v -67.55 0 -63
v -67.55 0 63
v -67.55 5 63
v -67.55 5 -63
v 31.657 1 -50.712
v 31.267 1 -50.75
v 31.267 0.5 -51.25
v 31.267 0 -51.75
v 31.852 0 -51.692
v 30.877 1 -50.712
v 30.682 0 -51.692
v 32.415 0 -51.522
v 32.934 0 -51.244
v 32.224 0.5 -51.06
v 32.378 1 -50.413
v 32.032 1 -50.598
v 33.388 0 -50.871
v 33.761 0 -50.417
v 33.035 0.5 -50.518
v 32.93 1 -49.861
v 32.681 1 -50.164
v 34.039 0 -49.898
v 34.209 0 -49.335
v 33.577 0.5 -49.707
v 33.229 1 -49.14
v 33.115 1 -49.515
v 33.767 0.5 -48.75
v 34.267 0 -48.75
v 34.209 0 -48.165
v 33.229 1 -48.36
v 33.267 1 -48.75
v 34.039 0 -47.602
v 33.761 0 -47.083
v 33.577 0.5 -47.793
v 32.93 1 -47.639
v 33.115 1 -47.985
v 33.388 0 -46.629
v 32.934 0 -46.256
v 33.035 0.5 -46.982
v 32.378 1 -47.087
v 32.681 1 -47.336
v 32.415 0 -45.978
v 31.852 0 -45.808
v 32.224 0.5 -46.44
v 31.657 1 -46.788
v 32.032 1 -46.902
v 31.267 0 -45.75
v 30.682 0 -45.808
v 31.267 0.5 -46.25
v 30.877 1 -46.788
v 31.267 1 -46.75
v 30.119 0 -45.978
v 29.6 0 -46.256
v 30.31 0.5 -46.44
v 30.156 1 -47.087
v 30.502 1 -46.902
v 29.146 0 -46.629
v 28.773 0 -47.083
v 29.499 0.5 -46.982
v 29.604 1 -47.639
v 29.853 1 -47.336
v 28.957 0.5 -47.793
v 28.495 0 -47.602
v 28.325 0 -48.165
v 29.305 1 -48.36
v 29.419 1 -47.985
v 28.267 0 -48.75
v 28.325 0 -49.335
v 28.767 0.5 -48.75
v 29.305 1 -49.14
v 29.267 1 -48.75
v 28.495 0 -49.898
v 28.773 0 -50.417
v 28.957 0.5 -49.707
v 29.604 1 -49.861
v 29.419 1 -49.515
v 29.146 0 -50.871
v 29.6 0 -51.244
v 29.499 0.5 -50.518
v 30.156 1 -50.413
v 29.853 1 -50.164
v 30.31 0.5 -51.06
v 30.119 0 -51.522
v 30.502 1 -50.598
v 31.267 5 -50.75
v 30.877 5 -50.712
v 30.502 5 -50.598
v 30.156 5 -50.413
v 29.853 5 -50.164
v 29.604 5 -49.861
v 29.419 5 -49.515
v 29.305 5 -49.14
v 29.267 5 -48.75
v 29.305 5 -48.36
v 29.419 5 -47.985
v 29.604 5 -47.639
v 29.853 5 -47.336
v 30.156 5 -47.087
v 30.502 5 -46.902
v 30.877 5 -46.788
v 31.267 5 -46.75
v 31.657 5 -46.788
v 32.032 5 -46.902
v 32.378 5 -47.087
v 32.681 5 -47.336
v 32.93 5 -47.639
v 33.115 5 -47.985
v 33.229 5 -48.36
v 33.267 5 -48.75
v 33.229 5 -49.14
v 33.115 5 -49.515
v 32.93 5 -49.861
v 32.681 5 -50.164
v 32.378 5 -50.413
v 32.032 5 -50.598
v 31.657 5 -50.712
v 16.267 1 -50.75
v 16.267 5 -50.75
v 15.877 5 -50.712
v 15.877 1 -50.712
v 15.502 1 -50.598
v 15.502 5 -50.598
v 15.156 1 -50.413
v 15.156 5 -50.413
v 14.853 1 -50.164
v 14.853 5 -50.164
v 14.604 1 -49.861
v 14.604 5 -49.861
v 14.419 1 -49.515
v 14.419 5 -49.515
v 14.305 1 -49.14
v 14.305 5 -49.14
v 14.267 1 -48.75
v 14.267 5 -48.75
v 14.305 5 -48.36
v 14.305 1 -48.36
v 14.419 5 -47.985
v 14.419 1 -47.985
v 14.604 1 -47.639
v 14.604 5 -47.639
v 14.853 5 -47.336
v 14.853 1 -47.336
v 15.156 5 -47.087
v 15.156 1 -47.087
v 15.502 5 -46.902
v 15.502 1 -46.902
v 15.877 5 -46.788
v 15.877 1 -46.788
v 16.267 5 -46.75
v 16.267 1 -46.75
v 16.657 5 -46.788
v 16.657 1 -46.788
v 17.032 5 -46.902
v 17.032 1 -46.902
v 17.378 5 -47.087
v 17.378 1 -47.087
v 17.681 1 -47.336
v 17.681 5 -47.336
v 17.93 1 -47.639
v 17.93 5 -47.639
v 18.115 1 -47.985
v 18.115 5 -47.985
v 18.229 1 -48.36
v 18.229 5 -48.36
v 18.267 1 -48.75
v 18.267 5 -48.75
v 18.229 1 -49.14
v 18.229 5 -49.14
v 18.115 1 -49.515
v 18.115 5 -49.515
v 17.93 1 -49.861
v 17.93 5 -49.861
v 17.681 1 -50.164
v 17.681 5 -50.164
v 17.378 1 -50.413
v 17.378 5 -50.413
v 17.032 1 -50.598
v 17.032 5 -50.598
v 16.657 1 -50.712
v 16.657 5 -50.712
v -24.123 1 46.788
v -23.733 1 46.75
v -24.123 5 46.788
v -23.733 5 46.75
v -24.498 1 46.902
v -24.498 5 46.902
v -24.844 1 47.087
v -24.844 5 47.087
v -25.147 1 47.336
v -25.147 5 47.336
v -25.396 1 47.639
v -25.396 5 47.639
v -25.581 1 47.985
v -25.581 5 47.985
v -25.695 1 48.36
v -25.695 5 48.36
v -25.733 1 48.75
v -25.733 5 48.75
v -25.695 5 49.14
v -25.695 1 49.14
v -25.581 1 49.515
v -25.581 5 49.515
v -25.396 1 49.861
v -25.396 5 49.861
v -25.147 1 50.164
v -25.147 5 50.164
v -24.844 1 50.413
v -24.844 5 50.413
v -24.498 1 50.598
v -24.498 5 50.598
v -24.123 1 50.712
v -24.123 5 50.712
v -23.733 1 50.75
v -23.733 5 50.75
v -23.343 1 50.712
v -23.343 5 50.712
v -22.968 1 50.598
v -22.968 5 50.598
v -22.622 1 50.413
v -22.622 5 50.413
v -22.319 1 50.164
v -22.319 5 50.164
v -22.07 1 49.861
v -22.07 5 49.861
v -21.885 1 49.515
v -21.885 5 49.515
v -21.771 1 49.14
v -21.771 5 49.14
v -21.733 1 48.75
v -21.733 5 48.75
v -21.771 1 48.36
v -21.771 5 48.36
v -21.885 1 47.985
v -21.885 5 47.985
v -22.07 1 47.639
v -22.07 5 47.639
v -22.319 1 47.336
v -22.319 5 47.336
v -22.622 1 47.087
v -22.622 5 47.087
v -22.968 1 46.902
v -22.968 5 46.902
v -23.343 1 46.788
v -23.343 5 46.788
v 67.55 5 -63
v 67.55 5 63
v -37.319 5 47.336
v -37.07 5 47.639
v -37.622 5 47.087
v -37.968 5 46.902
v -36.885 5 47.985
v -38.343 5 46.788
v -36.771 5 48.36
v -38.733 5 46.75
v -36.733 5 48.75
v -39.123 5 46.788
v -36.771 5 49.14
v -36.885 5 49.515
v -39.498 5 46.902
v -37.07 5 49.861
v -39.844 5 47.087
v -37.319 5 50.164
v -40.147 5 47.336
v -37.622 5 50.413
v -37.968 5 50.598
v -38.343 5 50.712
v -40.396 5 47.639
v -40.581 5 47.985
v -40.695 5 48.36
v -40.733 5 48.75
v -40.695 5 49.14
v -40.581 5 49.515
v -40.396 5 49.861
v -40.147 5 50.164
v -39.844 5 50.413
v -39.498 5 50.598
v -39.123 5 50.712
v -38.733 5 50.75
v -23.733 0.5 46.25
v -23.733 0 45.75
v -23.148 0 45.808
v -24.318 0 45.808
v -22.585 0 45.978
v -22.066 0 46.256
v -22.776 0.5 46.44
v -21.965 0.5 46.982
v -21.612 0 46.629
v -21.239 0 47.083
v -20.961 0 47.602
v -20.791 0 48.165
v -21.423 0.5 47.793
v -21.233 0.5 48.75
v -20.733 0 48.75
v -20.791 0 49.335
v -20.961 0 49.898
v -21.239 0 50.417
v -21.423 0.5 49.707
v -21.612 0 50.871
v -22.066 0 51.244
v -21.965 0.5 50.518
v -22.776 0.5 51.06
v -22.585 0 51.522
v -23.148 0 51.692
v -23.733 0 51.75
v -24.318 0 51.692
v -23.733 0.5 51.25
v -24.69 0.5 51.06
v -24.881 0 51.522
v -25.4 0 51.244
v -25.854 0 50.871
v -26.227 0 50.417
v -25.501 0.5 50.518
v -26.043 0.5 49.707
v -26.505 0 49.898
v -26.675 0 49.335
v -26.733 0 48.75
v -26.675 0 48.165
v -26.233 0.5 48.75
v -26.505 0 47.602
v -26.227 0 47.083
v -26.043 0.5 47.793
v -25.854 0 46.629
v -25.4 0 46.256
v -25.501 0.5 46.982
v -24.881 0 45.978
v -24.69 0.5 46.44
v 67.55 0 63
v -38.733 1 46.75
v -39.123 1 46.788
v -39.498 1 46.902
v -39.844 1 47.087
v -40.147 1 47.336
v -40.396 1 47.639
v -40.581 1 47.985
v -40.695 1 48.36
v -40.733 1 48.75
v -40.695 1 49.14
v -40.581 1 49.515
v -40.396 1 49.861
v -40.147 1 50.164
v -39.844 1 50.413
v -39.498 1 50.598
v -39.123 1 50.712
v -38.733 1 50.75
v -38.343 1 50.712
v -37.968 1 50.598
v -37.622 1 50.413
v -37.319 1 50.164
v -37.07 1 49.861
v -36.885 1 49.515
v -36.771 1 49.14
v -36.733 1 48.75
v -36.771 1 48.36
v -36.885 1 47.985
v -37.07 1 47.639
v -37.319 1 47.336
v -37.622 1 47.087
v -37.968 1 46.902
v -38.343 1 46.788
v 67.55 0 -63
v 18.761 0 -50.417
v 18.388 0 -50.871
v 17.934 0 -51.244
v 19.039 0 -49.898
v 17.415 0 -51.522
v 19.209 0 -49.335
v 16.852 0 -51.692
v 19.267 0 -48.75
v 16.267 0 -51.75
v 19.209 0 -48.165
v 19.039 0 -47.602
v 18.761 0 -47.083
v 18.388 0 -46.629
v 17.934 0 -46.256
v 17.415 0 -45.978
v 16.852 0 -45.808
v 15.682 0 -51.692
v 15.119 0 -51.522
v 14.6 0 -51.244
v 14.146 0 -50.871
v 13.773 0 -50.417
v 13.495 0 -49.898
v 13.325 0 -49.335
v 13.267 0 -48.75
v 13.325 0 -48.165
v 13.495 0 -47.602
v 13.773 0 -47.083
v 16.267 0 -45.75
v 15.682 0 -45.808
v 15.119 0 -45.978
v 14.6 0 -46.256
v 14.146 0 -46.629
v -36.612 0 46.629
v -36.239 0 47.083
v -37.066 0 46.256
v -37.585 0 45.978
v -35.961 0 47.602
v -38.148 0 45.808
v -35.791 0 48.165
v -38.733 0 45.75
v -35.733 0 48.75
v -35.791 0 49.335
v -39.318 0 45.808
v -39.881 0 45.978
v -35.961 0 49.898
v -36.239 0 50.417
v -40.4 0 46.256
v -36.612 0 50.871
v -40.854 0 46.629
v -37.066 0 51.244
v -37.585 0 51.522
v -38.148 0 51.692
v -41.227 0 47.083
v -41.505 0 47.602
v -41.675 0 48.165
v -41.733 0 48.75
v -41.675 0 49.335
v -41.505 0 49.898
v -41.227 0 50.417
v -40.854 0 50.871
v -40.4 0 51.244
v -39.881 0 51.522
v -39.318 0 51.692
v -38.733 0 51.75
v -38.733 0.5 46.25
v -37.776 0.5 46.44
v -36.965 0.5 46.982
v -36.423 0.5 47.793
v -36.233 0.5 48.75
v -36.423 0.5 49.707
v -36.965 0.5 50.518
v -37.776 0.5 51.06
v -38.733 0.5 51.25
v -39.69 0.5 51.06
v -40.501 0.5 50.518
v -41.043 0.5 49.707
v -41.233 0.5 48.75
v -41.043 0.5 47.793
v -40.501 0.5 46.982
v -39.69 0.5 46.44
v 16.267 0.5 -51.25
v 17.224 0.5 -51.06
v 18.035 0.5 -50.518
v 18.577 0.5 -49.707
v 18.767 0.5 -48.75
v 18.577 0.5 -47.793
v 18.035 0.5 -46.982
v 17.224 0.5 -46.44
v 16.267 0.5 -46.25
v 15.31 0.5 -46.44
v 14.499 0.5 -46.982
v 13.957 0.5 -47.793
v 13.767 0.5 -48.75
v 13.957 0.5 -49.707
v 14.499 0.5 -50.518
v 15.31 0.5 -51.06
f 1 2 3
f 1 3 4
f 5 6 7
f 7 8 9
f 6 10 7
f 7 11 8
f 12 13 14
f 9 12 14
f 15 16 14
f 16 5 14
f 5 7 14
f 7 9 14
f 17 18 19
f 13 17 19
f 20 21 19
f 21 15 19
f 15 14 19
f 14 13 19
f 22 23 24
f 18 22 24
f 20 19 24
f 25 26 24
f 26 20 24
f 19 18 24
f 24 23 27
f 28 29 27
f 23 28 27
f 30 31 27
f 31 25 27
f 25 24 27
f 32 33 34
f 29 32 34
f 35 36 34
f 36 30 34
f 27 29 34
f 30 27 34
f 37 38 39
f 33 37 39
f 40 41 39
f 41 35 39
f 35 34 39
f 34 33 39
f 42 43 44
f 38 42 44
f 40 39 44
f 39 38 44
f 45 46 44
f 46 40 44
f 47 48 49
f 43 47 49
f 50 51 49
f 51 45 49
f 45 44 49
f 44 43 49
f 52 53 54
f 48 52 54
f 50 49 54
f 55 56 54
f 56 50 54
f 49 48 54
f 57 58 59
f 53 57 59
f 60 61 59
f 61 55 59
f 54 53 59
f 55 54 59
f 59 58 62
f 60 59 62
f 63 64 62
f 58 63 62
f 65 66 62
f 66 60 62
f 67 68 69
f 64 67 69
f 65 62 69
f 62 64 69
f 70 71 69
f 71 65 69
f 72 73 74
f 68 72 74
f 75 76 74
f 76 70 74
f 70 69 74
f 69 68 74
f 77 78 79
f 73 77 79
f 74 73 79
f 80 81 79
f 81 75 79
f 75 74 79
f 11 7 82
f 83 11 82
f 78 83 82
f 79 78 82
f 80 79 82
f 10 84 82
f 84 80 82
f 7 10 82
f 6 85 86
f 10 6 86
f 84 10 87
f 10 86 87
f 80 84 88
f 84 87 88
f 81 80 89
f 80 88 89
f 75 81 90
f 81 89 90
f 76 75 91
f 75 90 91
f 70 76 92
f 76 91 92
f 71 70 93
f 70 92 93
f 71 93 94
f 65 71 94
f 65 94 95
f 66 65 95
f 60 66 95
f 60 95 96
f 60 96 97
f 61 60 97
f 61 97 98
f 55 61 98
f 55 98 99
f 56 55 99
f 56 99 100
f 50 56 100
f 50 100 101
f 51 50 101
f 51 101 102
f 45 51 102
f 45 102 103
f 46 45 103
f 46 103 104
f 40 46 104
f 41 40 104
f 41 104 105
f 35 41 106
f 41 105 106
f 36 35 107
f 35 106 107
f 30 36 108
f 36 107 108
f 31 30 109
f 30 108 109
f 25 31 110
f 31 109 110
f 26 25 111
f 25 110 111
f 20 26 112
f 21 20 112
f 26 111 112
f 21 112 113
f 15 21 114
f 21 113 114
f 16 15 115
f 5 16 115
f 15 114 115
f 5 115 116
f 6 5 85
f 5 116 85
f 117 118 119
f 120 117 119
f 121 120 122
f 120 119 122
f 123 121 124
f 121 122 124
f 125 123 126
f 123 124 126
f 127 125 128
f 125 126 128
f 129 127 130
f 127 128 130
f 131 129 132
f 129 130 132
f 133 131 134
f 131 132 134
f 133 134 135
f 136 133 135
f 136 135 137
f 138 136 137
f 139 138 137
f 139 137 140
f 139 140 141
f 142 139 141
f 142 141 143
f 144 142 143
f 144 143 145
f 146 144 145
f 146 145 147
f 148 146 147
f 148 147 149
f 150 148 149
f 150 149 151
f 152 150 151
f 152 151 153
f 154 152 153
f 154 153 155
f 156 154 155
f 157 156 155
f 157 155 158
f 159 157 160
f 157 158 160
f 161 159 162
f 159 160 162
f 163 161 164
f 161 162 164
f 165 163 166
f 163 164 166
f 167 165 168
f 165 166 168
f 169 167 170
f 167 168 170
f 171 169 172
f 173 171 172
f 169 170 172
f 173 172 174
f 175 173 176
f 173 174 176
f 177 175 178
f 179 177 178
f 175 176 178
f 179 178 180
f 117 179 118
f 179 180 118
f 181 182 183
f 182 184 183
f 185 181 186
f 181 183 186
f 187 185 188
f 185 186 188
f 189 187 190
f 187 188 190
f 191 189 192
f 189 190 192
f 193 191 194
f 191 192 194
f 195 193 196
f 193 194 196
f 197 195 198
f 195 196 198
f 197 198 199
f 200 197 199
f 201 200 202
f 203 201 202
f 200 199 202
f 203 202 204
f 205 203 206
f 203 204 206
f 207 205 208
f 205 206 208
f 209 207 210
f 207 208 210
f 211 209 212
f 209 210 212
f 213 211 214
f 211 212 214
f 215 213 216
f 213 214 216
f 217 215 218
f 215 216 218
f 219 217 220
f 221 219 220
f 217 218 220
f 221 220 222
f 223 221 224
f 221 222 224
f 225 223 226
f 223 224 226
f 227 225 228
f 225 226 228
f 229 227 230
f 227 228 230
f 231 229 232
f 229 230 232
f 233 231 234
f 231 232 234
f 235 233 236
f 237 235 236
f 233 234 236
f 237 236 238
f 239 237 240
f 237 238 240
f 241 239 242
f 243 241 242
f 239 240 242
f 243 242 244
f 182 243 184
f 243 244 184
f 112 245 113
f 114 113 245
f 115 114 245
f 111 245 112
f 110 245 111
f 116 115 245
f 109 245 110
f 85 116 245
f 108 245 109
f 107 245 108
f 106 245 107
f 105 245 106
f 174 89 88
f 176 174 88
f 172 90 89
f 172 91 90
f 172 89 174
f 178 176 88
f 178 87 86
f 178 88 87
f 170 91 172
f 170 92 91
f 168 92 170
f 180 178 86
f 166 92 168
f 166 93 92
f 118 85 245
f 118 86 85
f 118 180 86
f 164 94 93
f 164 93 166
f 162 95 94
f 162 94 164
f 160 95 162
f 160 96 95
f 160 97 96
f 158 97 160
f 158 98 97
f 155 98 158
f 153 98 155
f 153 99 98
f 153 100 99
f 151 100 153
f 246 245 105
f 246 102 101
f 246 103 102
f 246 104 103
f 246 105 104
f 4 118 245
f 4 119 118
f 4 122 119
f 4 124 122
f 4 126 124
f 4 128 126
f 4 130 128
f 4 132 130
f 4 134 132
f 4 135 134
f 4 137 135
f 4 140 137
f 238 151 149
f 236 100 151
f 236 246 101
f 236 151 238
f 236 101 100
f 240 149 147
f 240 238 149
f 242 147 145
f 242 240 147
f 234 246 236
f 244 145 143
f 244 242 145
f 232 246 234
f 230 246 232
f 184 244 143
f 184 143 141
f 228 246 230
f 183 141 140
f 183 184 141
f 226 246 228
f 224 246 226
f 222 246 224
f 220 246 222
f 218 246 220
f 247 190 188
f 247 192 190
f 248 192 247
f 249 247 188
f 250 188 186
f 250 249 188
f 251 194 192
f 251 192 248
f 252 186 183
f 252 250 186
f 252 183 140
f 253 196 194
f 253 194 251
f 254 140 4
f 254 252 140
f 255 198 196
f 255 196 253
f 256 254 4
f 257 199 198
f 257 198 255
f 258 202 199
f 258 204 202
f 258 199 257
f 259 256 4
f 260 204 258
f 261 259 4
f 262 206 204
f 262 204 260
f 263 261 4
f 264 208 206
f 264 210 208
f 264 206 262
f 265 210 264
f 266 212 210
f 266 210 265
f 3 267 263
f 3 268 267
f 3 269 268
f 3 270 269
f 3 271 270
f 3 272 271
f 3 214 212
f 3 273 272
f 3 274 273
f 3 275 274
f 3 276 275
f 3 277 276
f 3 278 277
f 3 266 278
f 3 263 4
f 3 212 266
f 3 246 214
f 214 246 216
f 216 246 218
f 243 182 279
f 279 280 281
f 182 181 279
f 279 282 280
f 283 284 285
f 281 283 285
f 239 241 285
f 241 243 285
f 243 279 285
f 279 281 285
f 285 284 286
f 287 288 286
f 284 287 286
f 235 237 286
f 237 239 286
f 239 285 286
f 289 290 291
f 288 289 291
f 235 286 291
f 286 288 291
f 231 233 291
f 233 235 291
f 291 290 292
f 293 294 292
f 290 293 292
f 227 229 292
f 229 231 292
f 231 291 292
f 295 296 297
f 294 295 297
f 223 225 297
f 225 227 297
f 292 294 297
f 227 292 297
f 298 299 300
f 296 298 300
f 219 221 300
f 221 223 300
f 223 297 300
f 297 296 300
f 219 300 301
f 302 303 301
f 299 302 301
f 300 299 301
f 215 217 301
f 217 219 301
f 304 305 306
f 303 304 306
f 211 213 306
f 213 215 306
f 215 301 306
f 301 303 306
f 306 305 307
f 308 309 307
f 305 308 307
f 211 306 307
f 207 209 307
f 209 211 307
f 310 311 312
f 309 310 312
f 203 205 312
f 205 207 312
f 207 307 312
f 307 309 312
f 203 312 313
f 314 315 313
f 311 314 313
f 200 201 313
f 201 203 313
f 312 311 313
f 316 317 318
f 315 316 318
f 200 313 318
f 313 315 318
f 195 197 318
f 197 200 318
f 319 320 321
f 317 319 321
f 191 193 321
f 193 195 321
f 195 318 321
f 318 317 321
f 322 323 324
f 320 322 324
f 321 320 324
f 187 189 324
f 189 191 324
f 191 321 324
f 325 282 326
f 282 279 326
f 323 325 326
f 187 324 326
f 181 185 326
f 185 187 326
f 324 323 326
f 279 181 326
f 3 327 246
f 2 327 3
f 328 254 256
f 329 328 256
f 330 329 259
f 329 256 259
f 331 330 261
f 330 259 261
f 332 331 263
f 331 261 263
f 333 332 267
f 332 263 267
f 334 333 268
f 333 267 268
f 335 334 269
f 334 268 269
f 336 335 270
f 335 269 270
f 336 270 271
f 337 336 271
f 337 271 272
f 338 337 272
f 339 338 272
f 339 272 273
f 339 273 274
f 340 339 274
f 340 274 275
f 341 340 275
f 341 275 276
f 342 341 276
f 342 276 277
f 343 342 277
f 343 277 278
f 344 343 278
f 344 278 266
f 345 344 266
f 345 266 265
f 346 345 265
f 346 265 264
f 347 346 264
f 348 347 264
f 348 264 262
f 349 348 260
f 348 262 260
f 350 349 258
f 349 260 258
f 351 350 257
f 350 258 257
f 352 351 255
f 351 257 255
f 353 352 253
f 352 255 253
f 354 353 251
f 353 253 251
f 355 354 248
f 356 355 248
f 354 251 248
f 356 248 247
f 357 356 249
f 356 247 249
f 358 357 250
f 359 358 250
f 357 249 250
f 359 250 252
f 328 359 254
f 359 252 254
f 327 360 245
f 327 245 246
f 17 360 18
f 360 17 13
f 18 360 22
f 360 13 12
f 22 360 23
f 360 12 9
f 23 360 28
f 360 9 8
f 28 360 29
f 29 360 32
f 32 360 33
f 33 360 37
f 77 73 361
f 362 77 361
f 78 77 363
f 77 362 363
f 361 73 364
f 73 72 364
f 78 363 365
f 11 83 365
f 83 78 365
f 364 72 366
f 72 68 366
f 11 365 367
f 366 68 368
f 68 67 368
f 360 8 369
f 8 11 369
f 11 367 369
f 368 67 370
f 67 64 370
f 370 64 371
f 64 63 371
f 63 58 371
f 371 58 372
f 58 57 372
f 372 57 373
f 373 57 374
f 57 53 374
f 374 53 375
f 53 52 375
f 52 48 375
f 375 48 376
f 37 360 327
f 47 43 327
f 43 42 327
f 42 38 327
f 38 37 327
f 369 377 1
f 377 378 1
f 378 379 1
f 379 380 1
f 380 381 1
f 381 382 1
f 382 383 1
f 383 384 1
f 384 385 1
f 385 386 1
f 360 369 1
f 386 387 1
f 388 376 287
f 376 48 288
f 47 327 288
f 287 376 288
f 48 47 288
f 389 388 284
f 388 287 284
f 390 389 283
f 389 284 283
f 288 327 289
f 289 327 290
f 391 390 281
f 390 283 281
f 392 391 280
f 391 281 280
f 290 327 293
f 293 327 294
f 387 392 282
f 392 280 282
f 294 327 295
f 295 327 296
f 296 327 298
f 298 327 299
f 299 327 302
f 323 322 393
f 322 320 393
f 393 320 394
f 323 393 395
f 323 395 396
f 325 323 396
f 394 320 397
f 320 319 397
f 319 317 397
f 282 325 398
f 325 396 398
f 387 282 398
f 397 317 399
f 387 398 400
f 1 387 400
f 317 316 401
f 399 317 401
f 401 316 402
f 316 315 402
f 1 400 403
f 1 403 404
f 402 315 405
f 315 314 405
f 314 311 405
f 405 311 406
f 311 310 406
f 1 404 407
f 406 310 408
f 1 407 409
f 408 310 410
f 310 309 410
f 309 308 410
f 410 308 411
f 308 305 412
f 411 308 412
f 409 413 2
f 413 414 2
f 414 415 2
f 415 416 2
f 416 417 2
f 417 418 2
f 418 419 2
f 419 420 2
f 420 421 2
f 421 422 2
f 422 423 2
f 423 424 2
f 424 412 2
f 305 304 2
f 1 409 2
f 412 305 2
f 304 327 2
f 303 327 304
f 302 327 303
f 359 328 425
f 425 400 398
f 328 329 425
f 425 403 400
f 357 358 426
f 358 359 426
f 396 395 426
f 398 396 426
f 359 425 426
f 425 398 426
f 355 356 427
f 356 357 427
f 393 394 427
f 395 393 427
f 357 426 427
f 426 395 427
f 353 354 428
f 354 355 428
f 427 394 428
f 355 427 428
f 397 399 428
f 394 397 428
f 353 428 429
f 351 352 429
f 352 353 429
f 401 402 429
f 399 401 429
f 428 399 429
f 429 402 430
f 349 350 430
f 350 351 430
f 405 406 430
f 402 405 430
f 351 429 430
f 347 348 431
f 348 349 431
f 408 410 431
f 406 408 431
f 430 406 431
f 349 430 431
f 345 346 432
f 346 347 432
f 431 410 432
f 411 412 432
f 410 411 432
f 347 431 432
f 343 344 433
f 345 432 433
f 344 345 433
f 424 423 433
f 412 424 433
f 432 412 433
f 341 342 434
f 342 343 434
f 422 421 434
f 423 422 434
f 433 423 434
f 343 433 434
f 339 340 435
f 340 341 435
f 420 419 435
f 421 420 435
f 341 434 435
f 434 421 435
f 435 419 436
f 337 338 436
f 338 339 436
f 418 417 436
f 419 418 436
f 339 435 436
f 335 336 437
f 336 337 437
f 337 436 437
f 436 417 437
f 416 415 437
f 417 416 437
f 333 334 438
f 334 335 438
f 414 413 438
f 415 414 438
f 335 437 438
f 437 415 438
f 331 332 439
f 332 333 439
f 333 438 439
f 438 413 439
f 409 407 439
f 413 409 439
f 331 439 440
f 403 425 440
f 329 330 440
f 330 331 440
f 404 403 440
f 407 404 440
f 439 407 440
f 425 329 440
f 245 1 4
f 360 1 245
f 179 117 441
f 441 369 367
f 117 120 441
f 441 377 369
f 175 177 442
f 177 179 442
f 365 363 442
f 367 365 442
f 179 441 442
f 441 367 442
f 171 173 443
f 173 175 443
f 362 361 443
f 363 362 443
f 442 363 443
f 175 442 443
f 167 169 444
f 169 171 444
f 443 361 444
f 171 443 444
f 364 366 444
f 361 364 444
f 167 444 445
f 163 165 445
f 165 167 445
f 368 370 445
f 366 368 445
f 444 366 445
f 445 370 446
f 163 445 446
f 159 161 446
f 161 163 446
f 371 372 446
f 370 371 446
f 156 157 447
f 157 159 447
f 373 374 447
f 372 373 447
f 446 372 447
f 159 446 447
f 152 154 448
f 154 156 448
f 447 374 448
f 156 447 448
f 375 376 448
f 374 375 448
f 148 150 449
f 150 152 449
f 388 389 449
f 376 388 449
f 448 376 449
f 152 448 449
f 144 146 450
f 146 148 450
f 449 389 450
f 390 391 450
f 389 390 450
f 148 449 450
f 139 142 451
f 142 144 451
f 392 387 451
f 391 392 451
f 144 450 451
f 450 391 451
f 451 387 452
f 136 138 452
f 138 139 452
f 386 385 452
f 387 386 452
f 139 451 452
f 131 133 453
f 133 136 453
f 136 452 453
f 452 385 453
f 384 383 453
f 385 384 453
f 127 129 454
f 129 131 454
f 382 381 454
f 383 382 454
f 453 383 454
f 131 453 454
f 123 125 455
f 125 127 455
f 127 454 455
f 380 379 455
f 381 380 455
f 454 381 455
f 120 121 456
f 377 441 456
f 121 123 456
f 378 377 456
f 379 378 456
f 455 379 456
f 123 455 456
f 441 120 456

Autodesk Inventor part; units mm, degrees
ref_plane "YZ Plane" through (0, 0, 0) normal (1, 0, 0) x (0, 1, 0)
ref_plane "XZ Plane" through (0, 0, 0) normal (0, 1, 0) x (-1, 0, 0)
ref_plane "XY Plane" through (0, 0, 0) normal (0, 0, 1) x (1, 0, 0)
sketch "Schizzo1" plane through (0, 0, 0) normal (0, 1, 0) x (-1, 0, 0)
  line L0 (-67.55, 63) -> (67.55, 63)
  line L1 (67.55, 63) -> (67.55, -63)
  line L2 (67.55, -63) -> (-67.55, -63)
  line L3 (-67.55, -63) -> (-67.55, 63)
  line L4 (-67.55, 63) -> (67.55, -63) construction
  line L5 (67.55, 63) -> (-67.55, -63) construction
  line L6 (67.55, -55.2) -> (43.733, -55.2) construction
  line L7 (43.733, -55.2) -> (-36.267, -55.2) construction
  line L8 (-36.267, -55.2) -> (-36.267, -42.3) construction
  line L9 (-36.267, -42.3) -> (43.733, -42.3) construction
  line L10 (43.733, -42.3) -> (43.733, -55.2) construction
  line L11 (-36.267, 63) -> (-36.267, 55.2) construction
  line L12 (-36.267, 55.2) -> (43.733, 55.2) construction
  line L13 (43.733, 55.2) -> (43.733, 42.3) construction
  line L14 (43.733, 42.3) -> (-36.267, 42.3) construction
  line L15 (-36.267, 42.3) -> (-36.267, 55.2) construction
  line L16 (-36.267, -48.75) -> (-31.267, -48.75) construction
  circle A0 centre (-31.267, -48.75) radius 2
  line L17 (-31.267, -48.75) -> (-16.267, -48.75) construction
  circle A1 centre (-16.267, -48.75) radius 2
  line L18 (43.733, 48.75) -> (38.733, 48.75) construction
  circle A2 centre (38.733, 48.75) radius 2
  line L19 (38.733, 48.75) -> (23.733, 48.75) construction
  circle A3 centre (23.733, 48.75) radius 2
  line L20 (-31.267, -63) -> (-31.267, -55.2) construction
  point P0 (0, 0)
  dimension "d0" = 135.1
  dimension "d1" = 126
  dimension "d18" = 23.817
  dimension "d19" = 80
  dimension "d20" = 12.9
  dimension "d21" = 7.8
  dimension "d22" = 12.9
  dimension "d23" = 5
  dimension "d24" = 31.283
  dimension "d26" = 4
  dimension "d27" = 15
  dimension "d28" = 4
  dimension "d37" = 5
  dimension "d38" = 4
  dimension "d39" = 15
  dimension "d40" = 4
  dimension "d55" = 7.8
extrude "Estrusione1" add sketch "Schizzo1" along normal blind 5 contours L0 L1 L2 L3 | A0 | A1 | A2 | A3
hole "Foro3" at (16.267, 0, -48.75) at (31.267, 0, -48.75) at (-23.733, 0, 48.75) at (-38.733, 0, 48.75) direction (0, 1, 0) diameter 4 depth 10 countersink diameter 6 countersink angle 90
properties part number "PiattoBilancia"
